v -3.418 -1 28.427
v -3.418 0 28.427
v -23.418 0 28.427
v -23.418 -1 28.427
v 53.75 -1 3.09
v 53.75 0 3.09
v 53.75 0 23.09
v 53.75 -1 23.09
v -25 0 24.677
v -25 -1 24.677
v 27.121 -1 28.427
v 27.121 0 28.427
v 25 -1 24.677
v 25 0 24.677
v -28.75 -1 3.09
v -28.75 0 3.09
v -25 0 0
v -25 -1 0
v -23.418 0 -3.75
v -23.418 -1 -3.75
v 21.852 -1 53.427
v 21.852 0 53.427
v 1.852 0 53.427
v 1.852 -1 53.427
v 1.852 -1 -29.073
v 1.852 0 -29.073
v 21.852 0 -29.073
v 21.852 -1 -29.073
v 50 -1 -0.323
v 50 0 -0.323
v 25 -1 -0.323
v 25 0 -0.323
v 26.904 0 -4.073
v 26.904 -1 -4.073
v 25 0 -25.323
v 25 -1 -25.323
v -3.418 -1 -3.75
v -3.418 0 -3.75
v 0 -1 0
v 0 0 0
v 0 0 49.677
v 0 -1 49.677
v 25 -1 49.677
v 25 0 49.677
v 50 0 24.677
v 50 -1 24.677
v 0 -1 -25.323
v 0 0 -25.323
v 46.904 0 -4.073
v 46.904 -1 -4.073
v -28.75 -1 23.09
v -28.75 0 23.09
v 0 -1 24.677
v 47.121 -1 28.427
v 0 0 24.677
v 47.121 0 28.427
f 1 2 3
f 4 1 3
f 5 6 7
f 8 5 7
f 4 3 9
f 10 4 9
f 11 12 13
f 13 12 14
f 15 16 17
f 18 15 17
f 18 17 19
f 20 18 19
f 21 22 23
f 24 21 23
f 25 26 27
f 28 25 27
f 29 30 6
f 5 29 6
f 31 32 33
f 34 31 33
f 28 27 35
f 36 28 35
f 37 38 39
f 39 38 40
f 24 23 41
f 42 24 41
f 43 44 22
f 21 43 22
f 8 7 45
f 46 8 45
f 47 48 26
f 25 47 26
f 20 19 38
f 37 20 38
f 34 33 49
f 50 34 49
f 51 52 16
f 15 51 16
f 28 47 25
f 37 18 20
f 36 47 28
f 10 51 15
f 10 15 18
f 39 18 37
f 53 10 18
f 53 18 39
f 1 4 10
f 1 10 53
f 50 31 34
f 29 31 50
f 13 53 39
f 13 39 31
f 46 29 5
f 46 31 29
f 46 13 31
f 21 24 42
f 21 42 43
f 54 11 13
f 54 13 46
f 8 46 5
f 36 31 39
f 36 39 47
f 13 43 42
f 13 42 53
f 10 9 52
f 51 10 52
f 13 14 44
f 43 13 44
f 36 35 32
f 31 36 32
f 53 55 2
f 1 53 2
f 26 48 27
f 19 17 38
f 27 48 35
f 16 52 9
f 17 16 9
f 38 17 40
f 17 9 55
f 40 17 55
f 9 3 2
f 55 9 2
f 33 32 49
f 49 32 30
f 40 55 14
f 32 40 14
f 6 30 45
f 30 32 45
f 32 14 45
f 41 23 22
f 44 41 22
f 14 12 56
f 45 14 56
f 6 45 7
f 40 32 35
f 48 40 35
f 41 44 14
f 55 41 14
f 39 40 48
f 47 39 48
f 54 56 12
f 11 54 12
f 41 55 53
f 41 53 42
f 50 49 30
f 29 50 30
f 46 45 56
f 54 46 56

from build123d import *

# Parameters (mm, degrees)
F0_W     = 25
F0_H     = 24.6772709091
F0_H_2   = 25
F1_DEPTH = 1


with BuildPart() as f1:
    # F0 (on Front) → F1 (new body)
    with BuildSketch(Plane.XZ):
        with Locations((-12.5, 12.3386354545)):
            Rectangle(F0_W, F0_H)
        Polygon((0, 24.6772709091), (0, 0), (25, -0.3227290909), (25, 24.6772709091), align=None)
        with Locations((12.5, 37.1772709091)):
            Rectangle(F0_W, F0_H_2)
        with Locations((37.5, 12.1772709091)):
            Rectangle(F0_W, F0_H_2)
        Polygon((25, -0.3227290909), (0, 0), (0, -25.3227290909), (25, -25.3227290909), align=None)
        Polygon((1.8516593846, 53.4272709091), (0, 49.6772709091), (25, 49.6772709091), (21.8516593846, 53.4272709091), align=None)
        Polygon((-25, 24.6772709091), (0, 24.6772709091), (-3.4180502594, 28.4272709091), (-23.4180502594, 28.4272709091), align=None)
        Polygon((-28.75, 3.0904370546), (-25, 0), (-25, 24.6772709091), (-28.75, 23.0904370546), align=None)
        Polygon((-3.4180502594, -3.75), (0, 0), (-25, 0), (-23.4180502594, -3.75), align=None)
        Polygon((25, -25.3227290909), (0, -25.3227290909), (1.8516593846, -29.0727290909), (21.8516593846, -29.0727290909), align=None)
        Polygon((50, -0.3227290909), (25, -0.3227290909), (26.9035287201, -4.0727290909), (46.9035287201, -4.0727290909), align=None)
        Polygon((50, 24.6772709091), (50, -0.3227290909), (53.75, 3.0904370546), (53.75, 23.0904370546), align=None)
        Polygon((27.1213706583, 28.4272709091), (25, 24.6772709091), (50, 24.6772709091), (47.1213706583, 28.4272709091), align=None)
    extrude(amount=F1_DEPTH)


solid = f1.part
